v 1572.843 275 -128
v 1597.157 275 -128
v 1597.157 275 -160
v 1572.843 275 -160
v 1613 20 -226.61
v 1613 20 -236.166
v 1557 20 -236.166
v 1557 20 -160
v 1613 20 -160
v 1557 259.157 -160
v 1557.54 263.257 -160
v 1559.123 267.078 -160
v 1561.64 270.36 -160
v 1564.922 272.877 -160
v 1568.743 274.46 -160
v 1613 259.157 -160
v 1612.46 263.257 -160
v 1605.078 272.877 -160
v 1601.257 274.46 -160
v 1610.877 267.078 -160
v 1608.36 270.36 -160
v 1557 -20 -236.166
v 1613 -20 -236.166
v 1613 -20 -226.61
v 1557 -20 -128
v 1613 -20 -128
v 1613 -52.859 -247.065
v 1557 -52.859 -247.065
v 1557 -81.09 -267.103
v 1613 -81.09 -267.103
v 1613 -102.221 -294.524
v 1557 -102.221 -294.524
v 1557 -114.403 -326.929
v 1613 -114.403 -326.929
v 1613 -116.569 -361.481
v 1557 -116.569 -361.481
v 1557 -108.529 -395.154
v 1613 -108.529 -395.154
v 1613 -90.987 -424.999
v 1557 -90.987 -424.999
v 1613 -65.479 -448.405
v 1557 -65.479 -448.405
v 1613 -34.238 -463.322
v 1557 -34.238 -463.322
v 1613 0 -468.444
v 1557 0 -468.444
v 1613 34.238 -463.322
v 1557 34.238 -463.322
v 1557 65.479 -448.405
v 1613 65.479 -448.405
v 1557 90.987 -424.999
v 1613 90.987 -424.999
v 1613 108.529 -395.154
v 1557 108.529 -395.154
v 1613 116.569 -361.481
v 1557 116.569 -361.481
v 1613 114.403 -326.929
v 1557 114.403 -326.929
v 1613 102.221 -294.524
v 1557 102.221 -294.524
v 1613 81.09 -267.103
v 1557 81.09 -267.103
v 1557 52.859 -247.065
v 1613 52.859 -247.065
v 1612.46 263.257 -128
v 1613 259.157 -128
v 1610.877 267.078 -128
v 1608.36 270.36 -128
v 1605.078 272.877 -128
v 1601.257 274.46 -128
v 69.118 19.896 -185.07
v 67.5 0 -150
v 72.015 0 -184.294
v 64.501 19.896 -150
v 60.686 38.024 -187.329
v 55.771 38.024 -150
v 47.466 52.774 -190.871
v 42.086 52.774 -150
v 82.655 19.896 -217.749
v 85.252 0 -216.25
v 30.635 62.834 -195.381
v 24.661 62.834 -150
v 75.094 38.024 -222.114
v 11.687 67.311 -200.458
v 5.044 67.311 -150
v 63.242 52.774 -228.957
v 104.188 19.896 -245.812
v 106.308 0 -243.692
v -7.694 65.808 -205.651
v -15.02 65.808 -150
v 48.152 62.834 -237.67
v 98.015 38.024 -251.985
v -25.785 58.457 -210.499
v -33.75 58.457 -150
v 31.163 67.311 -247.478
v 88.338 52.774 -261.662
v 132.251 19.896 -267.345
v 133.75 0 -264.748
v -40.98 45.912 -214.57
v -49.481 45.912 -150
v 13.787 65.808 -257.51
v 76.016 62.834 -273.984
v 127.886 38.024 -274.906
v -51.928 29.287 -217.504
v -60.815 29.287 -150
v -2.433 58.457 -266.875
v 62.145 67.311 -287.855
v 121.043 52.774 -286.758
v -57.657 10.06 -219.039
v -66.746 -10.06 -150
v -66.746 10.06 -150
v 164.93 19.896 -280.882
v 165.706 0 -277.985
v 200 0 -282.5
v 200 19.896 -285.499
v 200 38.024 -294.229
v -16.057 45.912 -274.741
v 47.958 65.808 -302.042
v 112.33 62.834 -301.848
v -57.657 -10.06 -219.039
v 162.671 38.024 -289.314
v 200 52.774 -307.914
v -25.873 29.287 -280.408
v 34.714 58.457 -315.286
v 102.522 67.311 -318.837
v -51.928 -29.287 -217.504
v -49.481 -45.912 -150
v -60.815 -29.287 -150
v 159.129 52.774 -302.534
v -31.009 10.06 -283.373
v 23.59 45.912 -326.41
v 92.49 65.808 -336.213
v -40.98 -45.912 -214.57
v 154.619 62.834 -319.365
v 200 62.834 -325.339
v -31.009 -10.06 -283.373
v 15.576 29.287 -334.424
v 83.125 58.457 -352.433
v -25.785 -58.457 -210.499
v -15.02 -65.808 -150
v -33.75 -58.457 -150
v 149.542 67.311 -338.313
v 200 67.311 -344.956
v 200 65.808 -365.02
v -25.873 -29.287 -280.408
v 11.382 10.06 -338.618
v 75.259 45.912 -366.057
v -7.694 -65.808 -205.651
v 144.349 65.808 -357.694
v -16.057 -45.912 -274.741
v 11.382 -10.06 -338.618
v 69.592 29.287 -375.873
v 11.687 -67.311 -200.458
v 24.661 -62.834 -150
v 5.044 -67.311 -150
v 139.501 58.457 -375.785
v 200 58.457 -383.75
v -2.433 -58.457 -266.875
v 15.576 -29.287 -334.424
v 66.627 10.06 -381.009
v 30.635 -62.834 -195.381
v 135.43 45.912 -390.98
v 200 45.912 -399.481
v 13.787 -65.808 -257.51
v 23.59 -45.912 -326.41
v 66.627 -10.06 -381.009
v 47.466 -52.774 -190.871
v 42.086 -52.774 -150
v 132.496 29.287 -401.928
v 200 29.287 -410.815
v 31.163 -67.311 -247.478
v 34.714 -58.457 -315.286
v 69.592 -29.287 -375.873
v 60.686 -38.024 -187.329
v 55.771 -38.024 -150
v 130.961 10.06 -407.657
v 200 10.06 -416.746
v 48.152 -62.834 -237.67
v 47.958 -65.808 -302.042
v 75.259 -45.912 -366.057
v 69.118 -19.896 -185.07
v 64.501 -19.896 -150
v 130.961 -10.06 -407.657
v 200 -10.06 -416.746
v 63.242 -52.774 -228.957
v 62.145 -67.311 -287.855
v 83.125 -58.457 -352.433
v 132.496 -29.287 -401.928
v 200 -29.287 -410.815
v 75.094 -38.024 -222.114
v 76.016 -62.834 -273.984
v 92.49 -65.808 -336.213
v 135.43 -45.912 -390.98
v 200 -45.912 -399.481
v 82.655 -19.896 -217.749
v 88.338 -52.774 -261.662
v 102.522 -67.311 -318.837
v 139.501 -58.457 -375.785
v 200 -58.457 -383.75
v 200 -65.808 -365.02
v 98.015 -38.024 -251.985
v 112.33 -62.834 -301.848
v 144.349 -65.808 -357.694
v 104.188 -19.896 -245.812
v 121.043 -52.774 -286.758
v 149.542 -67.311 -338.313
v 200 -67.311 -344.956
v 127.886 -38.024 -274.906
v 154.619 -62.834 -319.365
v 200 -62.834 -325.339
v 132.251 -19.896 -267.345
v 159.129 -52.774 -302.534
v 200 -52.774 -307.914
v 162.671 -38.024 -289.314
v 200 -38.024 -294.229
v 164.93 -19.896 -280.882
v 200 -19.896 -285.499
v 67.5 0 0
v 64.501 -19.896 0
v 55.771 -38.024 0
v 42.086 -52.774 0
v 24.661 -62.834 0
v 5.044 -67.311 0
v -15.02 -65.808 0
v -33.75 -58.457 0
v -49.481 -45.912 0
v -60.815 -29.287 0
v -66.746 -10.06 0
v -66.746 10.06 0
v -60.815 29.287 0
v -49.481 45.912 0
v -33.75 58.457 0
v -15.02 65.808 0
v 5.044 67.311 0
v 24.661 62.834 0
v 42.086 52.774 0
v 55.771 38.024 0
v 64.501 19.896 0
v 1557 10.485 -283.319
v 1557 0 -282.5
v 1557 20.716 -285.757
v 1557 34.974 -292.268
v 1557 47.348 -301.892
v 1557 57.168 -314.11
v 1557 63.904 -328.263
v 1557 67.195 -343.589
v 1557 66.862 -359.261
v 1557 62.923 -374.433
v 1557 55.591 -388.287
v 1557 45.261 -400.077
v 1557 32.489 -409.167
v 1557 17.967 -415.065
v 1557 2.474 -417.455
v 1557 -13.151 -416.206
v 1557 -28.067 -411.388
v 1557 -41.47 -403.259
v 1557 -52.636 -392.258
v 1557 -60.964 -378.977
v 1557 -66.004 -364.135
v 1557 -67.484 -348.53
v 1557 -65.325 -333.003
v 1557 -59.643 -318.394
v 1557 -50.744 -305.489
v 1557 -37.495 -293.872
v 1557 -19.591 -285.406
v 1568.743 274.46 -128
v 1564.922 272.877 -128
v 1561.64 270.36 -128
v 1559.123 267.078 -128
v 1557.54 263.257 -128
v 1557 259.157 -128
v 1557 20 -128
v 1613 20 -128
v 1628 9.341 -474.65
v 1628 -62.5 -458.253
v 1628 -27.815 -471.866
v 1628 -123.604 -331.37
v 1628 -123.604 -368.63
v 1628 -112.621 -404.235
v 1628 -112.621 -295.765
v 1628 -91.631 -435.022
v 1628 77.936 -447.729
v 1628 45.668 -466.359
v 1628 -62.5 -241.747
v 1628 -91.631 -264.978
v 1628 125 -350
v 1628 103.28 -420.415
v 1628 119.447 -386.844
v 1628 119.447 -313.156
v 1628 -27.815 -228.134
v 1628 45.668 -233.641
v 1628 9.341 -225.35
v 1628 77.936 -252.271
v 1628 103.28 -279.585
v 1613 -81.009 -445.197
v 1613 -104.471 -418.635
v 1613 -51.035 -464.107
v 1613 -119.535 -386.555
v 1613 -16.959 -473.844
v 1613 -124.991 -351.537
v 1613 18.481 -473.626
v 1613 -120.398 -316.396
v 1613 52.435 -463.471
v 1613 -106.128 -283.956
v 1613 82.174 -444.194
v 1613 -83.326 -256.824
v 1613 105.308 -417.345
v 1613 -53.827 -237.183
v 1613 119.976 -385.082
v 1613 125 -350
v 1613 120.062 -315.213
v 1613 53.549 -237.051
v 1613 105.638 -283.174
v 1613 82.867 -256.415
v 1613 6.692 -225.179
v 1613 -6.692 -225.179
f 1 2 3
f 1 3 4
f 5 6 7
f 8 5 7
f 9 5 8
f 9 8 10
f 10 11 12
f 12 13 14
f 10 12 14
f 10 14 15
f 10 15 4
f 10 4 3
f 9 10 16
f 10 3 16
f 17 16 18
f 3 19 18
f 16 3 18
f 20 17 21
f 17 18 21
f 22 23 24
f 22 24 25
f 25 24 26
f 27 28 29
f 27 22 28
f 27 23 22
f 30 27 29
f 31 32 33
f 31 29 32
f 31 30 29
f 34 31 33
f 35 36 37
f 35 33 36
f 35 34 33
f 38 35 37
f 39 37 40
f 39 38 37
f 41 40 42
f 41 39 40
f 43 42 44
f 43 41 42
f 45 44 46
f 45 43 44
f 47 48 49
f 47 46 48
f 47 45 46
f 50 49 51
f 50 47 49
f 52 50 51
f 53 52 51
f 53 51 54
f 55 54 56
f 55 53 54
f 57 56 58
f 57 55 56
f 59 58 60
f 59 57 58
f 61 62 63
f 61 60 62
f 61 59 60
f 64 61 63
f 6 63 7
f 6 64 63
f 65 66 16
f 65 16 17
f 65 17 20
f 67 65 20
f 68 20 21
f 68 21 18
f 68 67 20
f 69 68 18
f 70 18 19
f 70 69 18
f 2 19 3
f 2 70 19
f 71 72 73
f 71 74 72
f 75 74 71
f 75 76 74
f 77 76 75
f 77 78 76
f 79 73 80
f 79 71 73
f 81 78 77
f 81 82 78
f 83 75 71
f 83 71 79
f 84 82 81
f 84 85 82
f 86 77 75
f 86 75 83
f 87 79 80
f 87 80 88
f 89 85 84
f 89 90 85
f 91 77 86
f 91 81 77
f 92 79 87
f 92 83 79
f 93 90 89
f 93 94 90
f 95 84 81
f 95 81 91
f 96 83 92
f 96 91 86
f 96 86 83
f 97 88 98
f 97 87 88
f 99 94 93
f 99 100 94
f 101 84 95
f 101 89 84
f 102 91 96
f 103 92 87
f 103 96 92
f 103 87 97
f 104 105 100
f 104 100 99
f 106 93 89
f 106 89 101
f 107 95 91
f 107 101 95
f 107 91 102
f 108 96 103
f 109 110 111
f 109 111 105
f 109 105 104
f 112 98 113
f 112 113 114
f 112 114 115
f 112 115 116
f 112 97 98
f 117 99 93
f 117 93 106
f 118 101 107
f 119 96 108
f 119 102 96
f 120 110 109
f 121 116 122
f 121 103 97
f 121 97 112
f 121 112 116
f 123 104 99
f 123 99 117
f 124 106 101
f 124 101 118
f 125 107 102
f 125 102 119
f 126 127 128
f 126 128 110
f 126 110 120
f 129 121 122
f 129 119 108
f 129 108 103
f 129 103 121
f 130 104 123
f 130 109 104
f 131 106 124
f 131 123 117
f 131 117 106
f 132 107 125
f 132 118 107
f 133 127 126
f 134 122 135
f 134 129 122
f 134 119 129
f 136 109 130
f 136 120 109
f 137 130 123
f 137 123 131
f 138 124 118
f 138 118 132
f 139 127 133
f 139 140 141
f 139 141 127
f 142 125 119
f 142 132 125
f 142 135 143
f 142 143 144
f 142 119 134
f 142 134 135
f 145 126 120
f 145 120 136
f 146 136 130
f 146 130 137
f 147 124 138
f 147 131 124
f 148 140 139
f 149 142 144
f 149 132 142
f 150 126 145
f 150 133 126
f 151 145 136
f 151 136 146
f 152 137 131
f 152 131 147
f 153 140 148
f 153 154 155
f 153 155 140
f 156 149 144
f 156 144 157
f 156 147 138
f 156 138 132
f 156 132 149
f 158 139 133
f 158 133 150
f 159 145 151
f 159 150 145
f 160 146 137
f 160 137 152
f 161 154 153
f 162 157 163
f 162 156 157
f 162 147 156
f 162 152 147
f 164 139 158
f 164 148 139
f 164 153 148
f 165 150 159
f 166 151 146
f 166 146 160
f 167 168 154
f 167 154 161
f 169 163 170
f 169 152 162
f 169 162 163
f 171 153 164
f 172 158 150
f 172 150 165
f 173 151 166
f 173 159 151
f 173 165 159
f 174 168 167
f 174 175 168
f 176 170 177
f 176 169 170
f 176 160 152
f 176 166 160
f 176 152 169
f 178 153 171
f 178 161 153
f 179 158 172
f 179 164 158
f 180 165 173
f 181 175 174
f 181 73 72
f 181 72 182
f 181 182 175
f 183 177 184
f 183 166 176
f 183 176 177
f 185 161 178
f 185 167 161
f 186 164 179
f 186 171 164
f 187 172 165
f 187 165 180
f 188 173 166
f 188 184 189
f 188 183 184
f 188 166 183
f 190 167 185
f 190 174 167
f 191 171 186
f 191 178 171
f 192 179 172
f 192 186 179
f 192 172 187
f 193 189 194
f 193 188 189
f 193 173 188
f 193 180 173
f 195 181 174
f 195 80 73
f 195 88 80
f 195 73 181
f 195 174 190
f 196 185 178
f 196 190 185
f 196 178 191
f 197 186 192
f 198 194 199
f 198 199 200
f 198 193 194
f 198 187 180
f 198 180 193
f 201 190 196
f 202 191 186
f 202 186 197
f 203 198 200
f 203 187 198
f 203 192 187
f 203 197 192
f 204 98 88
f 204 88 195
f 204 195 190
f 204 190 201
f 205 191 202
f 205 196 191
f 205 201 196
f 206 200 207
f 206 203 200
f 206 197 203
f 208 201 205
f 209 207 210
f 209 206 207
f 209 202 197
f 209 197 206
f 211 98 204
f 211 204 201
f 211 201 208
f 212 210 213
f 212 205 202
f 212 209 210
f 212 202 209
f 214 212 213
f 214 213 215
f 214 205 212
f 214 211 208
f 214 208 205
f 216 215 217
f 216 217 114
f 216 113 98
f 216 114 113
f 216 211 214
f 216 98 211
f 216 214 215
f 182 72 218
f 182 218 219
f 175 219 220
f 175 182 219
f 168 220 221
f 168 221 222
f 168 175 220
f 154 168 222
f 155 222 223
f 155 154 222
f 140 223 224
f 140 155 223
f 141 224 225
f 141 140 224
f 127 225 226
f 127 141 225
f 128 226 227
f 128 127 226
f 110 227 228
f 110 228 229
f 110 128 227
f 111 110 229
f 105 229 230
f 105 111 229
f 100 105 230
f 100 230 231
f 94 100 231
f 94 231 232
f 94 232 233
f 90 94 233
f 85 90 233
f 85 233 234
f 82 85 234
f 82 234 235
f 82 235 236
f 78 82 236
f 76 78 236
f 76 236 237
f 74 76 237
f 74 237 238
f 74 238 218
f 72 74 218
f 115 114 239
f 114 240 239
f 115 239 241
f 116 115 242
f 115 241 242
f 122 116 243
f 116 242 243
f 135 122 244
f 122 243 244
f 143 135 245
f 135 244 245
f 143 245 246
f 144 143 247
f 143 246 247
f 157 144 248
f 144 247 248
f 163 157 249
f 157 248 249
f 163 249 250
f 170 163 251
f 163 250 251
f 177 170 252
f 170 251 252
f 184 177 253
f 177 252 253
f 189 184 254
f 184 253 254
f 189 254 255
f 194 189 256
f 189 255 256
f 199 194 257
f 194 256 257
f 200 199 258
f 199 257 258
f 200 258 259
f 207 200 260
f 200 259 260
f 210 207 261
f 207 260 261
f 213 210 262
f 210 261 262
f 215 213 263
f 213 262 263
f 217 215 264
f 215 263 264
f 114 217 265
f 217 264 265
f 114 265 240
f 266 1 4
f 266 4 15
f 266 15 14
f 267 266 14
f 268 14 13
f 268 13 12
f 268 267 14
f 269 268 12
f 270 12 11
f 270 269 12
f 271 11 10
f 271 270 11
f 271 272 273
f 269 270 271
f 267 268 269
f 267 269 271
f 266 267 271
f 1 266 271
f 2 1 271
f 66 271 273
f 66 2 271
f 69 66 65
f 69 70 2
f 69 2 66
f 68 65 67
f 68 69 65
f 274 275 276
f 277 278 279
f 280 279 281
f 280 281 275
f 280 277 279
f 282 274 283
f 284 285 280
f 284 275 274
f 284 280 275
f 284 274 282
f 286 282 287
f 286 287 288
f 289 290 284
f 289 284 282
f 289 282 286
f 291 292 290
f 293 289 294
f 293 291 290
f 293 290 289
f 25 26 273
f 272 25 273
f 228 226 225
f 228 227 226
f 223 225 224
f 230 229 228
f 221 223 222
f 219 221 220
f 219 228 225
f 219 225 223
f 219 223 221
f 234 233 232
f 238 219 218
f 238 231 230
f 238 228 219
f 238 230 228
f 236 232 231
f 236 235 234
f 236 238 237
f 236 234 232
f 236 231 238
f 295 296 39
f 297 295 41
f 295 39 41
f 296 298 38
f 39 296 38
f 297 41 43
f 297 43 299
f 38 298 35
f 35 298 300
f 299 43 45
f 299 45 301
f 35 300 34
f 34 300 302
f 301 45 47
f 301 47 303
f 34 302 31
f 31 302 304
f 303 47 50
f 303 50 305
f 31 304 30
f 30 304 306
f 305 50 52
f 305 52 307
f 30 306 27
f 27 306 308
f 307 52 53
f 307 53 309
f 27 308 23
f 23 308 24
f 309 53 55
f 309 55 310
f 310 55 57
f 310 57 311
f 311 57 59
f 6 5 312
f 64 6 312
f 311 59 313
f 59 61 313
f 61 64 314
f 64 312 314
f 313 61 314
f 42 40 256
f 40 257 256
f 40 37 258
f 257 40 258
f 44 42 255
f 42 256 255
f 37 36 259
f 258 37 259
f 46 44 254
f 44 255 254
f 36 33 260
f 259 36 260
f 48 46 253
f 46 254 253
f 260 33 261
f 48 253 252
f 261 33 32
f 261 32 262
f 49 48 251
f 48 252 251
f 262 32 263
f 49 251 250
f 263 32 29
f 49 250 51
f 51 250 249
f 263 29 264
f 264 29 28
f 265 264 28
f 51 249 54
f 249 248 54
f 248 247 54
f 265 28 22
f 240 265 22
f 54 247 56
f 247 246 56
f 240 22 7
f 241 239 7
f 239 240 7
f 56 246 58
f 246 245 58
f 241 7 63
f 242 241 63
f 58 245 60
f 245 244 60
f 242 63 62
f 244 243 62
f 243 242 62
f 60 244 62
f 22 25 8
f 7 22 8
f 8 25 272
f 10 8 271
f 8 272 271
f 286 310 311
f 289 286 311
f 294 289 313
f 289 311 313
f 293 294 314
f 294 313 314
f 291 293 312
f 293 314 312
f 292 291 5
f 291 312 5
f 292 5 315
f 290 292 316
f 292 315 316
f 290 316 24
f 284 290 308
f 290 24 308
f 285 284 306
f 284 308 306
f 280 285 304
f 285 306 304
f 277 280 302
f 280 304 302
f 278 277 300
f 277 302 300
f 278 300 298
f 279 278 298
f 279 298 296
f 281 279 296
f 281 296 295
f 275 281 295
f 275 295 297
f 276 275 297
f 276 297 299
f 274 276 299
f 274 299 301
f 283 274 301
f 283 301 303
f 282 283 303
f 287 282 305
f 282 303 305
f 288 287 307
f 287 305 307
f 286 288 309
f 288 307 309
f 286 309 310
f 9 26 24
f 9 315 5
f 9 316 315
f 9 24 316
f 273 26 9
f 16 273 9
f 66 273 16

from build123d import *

# Parameters (mm, degrees)
F3_R      = 125
F4_DEPTH  = 15
F0_R      = 67.5
F6_R      = 117
F7_DEPTH  = 56
F8_W      = 40
F8_H      = 195.041159
F9_DEPTH  = 56
F11_DEPTH = 32


with BuildPart() as f4:
    # F3 (on offset) → F4 (new body)
    with BuildSketch(Plane.YZ.offset(1613)):
        with Locations((0, -350)):
            Circle(F3_R)
    extrude(amount=F4_DEPTH)

    # F5: sweep along a path in F1
    with BuildLine(Plane.XZ) as f5_path:
        Line((0, 0), (0, -150))
        ThreePointArc((0, -150), (58.578644, -291.421356), (200, -350))
        Line((200, -350), (1613, -350))
    # F0 (on Top) → F5 (sweep)
    with BuildSketch(Plane.XY):
        Circle(F0_R)
    sweep(path=f5_path.line)

    # F6 (on offset) → F7 (join)
    with BuildSketch(Plane.YZ.offset(1613)):
        with Locations((0, -351.443887)):
            Circle(F6_R)
    extrude(amount=-F7_DEPTH)

    # F8 (on offset) → F9 (join)
    with BuildSketch(Plane.YZ.offset(1613)):
        with Locations((0, -225.520579)):
            Rectangle(F8_W, F8_H)
    extrude(amount=-F9_DEPTH)

    # F10 (on face) → F11 (join)
    with BuildSketch(Plane.XY.offset(-128)):
        with BuildLine():
            Line((1557, 259.156863), (1557, 20))
            Line((1557, 20), (1613, 20))
            Line((1613, 20), (1613, 259.156863))
            ThreePointArc((1613, 259.156863), (1608.359653, 270.359653), (1597.156863, 275))
            Line((1597.156863, 275), (1572.843137, 275))
            ThreePointArc((1572.843137, 275), (1561.640347, 270.359653), (1557, 259.156863))
        make_face()
    extrude(amount=-F11_DEPTH)


solid = f4.part
